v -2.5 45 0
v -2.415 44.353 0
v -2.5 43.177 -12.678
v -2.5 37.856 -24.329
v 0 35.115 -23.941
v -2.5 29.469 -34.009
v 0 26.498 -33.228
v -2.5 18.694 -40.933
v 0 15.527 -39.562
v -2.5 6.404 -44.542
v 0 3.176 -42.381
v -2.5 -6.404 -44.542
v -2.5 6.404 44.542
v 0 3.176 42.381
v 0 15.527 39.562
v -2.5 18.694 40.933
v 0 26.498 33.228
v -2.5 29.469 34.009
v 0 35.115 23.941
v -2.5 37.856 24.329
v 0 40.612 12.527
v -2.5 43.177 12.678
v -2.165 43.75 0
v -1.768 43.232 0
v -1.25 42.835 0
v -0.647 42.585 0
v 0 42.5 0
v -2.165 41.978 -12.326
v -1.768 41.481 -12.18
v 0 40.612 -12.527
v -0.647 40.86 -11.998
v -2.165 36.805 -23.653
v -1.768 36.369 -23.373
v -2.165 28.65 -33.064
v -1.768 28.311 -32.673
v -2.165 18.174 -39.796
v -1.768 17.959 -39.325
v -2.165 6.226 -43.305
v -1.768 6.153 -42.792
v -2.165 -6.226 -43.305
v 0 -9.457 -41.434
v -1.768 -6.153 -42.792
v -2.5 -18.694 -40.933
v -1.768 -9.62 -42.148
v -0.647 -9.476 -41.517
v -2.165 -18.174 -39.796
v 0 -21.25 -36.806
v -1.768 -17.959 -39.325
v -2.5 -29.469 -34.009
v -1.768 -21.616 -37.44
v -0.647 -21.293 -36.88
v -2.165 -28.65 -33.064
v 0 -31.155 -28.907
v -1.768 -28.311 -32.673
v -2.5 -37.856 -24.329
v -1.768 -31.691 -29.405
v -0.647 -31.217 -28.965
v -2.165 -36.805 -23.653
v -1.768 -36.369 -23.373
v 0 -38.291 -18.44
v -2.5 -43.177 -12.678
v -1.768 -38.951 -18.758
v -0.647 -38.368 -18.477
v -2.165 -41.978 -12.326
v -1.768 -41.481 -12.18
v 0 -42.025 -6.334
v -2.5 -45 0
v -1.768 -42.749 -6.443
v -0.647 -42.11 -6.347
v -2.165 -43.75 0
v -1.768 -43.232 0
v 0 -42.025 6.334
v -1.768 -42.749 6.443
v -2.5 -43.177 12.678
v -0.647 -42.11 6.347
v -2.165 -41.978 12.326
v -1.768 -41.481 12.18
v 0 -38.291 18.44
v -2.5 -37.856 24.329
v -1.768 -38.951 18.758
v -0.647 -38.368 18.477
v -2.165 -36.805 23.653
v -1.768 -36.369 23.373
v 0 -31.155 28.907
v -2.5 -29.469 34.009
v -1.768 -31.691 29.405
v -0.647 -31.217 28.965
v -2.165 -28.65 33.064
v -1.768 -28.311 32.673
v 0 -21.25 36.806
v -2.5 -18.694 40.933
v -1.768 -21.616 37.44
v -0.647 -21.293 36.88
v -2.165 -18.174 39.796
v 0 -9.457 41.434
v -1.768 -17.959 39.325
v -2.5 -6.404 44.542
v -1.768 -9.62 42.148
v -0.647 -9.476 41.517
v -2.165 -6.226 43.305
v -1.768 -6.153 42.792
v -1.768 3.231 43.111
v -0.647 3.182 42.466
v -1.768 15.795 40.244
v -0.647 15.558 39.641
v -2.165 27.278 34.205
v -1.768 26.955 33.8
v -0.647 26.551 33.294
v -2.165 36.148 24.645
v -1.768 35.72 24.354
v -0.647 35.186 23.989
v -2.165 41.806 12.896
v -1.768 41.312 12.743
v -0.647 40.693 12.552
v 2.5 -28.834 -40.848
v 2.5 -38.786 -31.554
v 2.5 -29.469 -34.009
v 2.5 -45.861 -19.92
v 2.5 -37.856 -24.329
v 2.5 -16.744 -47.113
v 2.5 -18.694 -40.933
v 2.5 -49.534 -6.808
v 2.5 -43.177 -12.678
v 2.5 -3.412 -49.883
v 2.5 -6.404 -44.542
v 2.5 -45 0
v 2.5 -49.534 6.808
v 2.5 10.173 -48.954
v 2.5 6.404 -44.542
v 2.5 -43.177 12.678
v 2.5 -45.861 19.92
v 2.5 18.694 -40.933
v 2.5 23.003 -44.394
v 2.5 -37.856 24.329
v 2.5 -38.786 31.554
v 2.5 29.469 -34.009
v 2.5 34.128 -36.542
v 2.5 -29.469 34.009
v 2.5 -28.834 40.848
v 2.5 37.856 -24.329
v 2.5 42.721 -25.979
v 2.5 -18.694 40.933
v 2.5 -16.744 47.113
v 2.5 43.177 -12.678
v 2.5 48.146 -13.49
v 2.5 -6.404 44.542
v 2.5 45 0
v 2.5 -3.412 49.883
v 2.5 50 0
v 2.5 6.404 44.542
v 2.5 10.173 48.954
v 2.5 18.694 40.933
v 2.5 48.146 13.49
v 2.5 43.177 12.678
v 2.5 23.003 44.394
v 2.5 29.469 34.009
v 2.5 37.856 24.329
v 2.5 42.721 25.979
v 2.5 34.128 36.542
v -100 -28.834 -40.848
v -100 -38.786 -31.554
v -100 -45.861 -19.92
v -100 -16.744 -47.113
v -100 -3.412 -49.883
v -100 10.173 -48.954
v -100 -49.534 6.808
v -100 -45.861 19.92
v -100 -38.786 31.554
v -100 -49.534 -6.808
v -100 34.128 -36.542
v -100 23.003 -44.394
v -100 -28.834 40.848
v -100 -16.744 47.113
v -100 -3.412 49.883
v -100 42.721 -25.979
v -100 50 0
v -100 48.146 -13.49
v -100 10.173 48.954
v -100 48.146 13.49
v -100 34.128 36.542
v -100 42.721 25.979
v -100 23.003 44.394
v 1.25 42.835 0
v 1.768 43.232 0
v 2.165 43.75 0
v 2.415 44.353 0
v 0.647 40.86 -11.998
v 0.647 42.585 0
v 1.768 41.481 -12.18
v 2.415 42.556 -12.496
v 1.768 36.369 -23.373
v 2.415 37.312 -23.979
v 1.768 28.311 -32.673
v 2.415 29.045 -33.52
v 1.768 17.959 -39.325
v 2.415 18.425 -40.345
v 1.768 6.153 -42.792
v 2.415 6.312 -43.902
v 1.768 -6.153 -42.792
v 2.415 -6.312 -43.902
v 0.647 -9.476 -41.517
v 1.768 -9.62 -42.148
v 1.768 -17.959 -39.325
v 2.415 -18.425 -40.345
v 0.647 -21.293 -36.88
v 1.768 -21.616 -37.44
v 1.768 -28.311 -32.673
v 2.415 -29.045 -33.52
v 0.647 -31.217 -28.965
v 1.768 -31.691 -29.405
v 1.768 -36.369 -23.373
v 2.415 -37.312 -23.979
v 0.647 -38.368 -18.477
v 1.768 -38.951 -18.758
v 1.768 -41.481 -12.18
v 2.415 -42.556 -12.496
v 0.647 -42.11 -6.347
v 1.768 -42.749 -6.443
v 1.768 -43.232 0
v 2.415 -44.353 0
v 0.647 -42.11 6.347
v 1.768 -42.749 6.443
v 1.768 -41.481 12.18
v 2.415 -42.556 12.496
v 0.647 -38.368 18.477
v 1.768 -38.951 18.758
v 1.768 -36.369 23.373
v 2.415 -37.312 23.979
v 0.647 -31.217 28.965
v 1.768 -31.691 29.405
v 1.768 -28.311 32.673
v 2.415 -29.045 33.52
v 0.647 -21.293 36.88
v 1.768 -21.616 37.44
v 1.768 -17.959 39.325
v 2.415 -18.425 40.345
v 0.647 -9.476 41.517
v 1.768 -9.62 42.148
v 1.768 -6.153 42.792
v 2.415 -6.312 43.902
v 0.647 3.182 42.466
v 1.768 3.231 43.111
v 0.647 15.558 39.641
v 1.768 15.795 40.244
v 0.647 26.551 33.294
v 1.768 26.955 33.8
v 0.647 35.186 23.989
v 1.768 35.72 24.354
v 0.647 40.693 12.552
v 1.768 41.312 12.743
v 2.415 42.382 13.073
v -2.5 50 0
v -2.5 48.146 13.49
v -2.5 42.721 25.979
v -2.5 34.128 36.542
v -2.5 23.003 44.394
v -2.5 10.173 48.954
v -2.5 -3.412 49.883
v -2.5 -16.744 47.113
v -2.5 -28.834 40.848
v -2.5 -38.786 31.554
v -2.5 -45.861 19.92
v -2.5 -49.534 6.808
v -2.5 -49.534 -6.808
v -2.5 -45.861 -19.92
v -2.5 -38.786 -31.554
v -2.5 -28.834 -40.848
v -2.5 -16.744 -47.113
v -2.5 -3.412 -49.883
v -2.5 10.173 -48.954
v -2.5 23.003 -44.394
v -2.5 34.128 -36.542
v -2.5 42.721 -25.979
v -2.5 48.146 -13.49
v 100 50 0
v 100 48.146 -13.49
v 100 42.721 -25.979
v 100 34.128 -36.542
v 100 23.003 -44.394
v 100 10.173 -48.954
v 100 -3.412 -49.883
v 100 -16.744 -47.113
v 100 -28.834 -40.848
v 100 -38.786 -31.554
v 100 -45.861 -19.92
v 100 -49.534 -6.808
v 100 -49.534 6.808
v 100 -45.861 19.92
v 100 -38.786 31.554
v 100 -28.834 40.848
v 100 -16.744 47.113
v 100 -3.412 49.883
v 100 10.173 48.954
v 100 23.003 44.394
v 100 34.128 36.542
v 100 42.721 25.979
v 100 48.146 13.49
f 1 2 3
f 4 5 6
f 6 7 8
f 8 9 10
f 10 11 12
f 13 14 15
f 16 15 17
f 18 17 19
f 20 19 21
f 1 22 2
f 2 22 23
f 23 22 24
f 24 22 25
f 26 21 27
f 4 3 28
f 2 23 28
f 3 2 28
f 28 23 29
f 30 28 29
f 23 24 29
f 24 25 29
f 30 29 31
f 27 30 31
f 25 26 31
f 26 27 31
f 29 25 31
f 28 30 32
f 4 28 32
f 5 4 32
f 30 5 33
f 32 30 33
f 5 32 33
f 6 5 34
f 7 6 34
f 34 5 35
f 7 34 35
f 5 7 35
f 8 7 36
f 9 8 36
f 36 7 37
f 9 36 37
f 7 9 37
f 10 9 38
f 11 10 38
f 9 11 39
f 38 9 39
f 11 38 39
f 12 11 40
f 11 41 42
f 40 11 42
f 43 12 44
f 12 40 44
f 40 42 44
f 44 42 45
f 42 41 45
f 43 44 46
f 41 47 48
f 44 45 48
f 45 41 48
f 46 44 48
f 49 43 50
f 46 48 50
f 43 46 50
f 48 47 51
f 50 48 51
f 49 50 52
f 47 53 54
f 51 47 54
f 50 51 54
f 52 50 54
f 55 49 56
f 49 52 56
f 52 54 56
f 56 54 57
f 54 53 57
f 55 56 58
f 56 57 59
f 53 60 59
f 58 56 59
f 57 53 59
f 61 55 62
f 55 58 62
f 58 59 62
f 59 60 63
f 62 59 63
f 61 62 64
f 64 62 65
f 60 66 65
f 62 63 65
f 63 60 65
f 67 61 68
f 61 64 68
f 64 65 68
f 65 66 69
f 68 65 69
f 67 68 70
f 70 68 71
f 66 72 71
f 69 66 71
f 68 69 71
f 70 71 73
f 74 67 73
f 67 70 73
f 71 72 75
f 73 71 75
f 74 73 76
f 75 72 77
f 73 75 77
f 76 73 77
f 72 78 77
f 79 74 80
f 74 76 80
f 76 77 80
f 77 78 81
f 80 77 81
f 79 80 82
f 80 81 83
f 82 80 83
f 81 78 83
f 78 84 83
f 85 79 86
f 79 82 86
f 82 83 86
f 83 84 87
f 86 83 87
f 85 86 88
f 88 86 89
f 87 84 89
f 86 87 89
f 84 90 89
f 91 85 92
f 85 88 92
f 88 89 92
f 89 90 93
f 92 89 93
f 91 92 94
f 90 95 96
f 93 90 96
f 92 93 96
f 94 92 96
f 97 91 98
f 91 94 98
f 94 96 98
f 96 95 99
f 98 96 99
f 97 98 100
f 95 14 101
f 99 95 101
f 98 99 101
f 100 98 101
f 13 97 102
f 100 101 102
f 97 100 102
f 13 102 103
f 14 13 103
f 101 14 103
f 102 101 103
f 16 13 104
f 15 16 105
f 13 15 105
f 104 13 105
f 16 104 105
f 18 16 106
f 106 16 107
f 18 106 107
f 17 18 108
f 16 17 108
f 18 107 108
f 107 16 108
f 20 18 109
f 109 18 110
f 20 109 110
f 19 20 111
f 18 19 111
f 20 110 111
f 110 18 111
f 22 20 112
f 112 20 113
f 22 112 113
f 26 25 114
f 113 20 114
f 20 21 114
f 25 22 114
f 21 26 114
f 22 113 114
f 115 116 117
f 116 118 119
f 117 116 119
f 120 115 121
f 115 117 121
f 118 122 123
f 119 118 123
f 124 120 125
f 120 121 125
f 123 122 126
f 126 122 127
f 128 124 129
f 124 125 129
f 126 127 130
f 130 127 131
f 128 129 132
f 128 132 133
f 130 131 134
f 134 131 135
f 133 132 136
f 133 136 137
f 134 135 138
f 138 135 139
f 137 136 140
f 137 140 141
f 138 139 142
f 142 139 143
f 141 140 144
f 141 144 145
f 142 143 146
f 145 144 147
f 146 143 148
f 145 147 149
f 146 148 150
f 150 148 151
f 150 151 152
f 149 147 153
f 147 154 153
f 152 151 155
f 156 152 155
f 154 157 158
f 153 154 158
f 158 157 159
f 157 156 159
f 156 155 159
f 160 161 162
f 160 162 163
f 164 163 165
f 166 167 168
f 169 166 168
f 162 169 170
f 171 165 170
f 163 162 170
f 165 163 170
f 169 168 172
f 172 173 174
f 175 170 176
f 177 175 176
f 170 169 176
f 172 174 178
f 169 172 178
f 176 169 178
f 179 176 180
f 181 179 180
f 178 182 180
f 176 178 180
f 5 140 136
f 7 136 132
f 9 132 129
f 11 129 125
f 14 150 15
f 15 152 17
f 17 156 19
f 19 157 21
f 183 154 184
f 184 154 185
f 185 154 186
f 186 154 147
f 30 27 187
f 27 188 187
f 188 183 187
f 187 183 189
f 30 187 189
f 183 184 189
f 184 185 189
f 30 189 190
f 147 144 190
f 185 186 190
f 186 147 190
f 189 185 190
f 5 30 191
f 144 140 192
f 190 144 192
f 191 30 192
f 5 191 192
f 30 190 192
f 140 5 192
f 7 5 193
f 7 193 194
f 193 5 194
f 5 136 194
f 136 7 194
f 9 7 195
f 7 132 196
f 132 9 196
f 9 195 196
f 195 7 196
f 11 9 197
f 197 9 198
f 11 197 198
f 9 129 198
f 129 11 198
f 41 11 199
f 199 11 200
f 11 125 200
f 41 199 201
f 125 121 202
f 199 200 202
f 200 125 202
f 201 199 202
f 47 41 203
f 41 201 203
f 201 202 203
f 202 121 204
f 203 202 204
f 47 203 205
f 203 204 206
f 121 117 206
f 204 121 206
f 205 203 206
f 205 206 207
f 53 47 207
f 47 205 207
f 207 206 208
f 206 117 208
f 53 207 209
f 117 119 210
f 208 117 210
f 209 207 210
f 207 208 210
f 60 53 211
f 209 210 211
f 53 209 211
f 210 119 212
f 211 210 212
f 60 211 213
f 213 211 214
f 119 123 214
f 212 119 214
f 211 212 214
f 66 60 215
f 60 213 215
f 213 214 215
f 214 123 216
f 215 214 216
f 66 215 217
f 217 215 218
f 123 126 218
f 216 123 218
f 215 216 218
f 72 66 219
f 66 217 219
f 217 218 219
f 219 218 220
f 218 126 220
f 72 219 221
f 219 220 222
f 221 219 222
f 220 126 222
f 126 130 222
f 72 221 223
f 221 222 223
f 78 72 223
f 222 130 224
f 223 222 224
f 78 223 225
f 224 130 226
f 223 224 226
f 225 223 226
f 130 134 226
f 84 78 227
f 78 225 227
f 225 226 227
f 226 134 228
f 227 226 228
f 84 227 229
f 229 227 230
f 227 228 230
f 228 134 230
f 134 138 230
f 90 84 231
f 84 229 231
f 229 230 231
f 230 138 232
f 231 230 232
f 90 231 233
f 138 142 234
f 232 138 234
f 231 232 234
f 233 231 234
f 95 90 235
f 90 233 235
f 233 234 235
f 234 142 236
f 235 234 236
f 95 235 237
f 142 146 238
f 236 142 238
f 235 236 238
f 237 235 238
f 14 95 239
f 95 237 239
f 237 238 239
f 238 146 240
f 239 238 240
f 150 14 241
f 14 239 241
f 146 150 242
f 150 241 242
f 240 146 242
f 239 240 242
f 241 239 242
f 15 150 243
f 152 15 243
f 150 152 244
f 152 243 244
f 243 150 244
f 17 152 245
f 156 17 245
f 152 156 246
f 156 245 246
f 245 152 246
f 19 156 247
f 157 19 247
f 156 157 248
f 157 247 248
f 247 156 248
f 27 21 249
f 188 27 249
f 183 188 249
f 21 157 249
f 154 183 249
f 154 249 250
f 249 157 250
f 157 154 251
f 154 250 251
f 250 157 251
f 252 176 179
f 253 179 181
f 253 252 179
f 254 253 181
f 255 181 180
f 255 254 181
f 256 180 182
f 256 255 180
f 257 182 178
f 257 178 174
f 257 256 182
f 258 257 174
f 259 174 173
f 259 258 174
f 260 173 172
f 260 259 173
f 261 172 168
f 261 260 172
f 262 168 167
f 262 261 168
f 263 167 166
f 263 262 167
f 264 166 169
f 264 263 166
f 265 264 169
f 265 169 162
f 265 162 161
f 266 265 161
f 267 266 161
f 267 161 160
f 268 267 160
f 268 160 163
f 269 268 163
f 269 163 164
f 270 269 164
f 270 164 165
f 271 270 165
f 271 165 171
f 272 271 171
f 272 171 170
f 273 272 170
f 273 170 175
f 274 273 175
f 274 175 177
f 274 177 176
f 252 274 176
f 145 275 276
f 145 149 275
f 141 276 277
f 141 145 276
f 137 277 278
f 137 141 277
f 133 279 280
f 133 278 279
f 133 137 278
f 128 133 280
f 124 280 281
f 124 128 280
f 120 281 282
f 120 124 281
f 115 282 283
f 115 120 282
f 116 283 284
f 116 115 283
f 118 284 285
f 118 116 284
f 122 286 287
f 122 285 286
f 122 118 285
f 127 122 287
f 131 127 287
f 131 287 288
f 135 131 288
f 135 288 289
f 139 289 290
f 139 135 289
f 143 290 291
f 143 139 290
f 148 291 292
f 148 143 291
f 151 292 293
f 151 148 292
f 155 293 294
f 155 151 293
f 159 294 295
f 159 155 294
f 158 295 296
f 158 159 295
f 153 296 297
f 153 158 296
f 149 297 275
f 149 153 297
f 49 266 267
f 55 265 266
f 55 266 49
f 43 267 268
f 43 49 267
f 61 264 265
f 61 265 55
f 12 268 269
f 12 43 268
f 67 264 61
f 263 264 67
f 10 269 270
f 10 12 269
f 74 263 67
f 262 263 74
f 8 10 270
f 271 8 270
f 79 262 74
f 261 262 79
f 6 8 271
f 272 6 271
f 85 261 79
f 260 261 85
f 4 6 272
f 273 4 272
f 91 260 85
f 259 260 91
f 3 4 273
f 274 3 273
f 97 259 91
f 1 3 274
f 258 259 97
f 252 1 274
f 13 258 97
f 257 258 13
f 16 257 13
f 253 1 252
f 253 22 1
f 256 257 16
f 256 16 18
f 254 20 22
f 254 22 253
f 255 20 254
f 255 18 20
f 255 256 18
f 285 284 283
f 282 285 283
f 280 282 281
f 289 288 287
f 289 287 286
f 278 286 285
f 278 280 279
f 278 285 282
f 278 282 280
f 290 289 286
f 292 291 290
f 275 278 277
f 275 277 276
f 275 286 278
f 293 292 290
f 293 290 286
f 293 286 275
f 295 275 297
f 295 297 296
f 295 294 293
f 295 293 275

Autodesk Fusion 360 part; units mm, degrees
sketch "Sketch1" plane through (0, 0, 0) normal (0, 0, 1) x (1, 0, 0)
  line L0 (100, 0) -> (100, 50)
  line L1 (100, 50) -> (2.5, 50)
  line L2 (2.5, 50) -> (2.5, 45)
  arc A0 (0, 42.5) -> (2.5, 45) centre (0, 45) ccw
  line L3 (0, 0) -> (100, 0) construction
  line L4 (0, 0) -> (0, 45) construction
  line L5 (0, 42.5) -> (100, 42.5) construction
  line L6 (100, 0) -> (100, -50) construction
  line L7 (100, -50) -> (2.5, -50) construction
  line L8 (2.5, -50) -> (2.5, -45) construction
  arc A1 (2.5, -45) -> (0, -42.5) centre (0, -45) ccw construction
  arc A2 (-2.5, 45) -> (0, 42.5) centre (0, 45) ccw
  line L9 (-2.5, 50) -> (-2.5, 45)
  line L10 (-100, 50) -> (-2.5, 50)
  line L11 (-100, 0) -> (-100, 50)
  line L12 (-100, 0) -> (-100, -50) construction
  line L13 (-100, -50) -> (-2.5, -50) construction
  line L14 (-2.5, -50) -> (-2.5, -45) construction
  arc A3 (0, -42.5) -> (-2.5, -45) centre (0, -45) ccw construction
  line L15 (100, 0) -> (-100, 0)
  dimension "Notch_Radius" = 2.5
  dimension "Notch_Height" = 7.5
  dimension "Bar_Diameter" = 100
  dimension "Bar_Length" = 200
revolve "Revolve1" add sketch "Sketch1" angle 360 about axis through (0, 0, 0) along (1, 0, 0)
